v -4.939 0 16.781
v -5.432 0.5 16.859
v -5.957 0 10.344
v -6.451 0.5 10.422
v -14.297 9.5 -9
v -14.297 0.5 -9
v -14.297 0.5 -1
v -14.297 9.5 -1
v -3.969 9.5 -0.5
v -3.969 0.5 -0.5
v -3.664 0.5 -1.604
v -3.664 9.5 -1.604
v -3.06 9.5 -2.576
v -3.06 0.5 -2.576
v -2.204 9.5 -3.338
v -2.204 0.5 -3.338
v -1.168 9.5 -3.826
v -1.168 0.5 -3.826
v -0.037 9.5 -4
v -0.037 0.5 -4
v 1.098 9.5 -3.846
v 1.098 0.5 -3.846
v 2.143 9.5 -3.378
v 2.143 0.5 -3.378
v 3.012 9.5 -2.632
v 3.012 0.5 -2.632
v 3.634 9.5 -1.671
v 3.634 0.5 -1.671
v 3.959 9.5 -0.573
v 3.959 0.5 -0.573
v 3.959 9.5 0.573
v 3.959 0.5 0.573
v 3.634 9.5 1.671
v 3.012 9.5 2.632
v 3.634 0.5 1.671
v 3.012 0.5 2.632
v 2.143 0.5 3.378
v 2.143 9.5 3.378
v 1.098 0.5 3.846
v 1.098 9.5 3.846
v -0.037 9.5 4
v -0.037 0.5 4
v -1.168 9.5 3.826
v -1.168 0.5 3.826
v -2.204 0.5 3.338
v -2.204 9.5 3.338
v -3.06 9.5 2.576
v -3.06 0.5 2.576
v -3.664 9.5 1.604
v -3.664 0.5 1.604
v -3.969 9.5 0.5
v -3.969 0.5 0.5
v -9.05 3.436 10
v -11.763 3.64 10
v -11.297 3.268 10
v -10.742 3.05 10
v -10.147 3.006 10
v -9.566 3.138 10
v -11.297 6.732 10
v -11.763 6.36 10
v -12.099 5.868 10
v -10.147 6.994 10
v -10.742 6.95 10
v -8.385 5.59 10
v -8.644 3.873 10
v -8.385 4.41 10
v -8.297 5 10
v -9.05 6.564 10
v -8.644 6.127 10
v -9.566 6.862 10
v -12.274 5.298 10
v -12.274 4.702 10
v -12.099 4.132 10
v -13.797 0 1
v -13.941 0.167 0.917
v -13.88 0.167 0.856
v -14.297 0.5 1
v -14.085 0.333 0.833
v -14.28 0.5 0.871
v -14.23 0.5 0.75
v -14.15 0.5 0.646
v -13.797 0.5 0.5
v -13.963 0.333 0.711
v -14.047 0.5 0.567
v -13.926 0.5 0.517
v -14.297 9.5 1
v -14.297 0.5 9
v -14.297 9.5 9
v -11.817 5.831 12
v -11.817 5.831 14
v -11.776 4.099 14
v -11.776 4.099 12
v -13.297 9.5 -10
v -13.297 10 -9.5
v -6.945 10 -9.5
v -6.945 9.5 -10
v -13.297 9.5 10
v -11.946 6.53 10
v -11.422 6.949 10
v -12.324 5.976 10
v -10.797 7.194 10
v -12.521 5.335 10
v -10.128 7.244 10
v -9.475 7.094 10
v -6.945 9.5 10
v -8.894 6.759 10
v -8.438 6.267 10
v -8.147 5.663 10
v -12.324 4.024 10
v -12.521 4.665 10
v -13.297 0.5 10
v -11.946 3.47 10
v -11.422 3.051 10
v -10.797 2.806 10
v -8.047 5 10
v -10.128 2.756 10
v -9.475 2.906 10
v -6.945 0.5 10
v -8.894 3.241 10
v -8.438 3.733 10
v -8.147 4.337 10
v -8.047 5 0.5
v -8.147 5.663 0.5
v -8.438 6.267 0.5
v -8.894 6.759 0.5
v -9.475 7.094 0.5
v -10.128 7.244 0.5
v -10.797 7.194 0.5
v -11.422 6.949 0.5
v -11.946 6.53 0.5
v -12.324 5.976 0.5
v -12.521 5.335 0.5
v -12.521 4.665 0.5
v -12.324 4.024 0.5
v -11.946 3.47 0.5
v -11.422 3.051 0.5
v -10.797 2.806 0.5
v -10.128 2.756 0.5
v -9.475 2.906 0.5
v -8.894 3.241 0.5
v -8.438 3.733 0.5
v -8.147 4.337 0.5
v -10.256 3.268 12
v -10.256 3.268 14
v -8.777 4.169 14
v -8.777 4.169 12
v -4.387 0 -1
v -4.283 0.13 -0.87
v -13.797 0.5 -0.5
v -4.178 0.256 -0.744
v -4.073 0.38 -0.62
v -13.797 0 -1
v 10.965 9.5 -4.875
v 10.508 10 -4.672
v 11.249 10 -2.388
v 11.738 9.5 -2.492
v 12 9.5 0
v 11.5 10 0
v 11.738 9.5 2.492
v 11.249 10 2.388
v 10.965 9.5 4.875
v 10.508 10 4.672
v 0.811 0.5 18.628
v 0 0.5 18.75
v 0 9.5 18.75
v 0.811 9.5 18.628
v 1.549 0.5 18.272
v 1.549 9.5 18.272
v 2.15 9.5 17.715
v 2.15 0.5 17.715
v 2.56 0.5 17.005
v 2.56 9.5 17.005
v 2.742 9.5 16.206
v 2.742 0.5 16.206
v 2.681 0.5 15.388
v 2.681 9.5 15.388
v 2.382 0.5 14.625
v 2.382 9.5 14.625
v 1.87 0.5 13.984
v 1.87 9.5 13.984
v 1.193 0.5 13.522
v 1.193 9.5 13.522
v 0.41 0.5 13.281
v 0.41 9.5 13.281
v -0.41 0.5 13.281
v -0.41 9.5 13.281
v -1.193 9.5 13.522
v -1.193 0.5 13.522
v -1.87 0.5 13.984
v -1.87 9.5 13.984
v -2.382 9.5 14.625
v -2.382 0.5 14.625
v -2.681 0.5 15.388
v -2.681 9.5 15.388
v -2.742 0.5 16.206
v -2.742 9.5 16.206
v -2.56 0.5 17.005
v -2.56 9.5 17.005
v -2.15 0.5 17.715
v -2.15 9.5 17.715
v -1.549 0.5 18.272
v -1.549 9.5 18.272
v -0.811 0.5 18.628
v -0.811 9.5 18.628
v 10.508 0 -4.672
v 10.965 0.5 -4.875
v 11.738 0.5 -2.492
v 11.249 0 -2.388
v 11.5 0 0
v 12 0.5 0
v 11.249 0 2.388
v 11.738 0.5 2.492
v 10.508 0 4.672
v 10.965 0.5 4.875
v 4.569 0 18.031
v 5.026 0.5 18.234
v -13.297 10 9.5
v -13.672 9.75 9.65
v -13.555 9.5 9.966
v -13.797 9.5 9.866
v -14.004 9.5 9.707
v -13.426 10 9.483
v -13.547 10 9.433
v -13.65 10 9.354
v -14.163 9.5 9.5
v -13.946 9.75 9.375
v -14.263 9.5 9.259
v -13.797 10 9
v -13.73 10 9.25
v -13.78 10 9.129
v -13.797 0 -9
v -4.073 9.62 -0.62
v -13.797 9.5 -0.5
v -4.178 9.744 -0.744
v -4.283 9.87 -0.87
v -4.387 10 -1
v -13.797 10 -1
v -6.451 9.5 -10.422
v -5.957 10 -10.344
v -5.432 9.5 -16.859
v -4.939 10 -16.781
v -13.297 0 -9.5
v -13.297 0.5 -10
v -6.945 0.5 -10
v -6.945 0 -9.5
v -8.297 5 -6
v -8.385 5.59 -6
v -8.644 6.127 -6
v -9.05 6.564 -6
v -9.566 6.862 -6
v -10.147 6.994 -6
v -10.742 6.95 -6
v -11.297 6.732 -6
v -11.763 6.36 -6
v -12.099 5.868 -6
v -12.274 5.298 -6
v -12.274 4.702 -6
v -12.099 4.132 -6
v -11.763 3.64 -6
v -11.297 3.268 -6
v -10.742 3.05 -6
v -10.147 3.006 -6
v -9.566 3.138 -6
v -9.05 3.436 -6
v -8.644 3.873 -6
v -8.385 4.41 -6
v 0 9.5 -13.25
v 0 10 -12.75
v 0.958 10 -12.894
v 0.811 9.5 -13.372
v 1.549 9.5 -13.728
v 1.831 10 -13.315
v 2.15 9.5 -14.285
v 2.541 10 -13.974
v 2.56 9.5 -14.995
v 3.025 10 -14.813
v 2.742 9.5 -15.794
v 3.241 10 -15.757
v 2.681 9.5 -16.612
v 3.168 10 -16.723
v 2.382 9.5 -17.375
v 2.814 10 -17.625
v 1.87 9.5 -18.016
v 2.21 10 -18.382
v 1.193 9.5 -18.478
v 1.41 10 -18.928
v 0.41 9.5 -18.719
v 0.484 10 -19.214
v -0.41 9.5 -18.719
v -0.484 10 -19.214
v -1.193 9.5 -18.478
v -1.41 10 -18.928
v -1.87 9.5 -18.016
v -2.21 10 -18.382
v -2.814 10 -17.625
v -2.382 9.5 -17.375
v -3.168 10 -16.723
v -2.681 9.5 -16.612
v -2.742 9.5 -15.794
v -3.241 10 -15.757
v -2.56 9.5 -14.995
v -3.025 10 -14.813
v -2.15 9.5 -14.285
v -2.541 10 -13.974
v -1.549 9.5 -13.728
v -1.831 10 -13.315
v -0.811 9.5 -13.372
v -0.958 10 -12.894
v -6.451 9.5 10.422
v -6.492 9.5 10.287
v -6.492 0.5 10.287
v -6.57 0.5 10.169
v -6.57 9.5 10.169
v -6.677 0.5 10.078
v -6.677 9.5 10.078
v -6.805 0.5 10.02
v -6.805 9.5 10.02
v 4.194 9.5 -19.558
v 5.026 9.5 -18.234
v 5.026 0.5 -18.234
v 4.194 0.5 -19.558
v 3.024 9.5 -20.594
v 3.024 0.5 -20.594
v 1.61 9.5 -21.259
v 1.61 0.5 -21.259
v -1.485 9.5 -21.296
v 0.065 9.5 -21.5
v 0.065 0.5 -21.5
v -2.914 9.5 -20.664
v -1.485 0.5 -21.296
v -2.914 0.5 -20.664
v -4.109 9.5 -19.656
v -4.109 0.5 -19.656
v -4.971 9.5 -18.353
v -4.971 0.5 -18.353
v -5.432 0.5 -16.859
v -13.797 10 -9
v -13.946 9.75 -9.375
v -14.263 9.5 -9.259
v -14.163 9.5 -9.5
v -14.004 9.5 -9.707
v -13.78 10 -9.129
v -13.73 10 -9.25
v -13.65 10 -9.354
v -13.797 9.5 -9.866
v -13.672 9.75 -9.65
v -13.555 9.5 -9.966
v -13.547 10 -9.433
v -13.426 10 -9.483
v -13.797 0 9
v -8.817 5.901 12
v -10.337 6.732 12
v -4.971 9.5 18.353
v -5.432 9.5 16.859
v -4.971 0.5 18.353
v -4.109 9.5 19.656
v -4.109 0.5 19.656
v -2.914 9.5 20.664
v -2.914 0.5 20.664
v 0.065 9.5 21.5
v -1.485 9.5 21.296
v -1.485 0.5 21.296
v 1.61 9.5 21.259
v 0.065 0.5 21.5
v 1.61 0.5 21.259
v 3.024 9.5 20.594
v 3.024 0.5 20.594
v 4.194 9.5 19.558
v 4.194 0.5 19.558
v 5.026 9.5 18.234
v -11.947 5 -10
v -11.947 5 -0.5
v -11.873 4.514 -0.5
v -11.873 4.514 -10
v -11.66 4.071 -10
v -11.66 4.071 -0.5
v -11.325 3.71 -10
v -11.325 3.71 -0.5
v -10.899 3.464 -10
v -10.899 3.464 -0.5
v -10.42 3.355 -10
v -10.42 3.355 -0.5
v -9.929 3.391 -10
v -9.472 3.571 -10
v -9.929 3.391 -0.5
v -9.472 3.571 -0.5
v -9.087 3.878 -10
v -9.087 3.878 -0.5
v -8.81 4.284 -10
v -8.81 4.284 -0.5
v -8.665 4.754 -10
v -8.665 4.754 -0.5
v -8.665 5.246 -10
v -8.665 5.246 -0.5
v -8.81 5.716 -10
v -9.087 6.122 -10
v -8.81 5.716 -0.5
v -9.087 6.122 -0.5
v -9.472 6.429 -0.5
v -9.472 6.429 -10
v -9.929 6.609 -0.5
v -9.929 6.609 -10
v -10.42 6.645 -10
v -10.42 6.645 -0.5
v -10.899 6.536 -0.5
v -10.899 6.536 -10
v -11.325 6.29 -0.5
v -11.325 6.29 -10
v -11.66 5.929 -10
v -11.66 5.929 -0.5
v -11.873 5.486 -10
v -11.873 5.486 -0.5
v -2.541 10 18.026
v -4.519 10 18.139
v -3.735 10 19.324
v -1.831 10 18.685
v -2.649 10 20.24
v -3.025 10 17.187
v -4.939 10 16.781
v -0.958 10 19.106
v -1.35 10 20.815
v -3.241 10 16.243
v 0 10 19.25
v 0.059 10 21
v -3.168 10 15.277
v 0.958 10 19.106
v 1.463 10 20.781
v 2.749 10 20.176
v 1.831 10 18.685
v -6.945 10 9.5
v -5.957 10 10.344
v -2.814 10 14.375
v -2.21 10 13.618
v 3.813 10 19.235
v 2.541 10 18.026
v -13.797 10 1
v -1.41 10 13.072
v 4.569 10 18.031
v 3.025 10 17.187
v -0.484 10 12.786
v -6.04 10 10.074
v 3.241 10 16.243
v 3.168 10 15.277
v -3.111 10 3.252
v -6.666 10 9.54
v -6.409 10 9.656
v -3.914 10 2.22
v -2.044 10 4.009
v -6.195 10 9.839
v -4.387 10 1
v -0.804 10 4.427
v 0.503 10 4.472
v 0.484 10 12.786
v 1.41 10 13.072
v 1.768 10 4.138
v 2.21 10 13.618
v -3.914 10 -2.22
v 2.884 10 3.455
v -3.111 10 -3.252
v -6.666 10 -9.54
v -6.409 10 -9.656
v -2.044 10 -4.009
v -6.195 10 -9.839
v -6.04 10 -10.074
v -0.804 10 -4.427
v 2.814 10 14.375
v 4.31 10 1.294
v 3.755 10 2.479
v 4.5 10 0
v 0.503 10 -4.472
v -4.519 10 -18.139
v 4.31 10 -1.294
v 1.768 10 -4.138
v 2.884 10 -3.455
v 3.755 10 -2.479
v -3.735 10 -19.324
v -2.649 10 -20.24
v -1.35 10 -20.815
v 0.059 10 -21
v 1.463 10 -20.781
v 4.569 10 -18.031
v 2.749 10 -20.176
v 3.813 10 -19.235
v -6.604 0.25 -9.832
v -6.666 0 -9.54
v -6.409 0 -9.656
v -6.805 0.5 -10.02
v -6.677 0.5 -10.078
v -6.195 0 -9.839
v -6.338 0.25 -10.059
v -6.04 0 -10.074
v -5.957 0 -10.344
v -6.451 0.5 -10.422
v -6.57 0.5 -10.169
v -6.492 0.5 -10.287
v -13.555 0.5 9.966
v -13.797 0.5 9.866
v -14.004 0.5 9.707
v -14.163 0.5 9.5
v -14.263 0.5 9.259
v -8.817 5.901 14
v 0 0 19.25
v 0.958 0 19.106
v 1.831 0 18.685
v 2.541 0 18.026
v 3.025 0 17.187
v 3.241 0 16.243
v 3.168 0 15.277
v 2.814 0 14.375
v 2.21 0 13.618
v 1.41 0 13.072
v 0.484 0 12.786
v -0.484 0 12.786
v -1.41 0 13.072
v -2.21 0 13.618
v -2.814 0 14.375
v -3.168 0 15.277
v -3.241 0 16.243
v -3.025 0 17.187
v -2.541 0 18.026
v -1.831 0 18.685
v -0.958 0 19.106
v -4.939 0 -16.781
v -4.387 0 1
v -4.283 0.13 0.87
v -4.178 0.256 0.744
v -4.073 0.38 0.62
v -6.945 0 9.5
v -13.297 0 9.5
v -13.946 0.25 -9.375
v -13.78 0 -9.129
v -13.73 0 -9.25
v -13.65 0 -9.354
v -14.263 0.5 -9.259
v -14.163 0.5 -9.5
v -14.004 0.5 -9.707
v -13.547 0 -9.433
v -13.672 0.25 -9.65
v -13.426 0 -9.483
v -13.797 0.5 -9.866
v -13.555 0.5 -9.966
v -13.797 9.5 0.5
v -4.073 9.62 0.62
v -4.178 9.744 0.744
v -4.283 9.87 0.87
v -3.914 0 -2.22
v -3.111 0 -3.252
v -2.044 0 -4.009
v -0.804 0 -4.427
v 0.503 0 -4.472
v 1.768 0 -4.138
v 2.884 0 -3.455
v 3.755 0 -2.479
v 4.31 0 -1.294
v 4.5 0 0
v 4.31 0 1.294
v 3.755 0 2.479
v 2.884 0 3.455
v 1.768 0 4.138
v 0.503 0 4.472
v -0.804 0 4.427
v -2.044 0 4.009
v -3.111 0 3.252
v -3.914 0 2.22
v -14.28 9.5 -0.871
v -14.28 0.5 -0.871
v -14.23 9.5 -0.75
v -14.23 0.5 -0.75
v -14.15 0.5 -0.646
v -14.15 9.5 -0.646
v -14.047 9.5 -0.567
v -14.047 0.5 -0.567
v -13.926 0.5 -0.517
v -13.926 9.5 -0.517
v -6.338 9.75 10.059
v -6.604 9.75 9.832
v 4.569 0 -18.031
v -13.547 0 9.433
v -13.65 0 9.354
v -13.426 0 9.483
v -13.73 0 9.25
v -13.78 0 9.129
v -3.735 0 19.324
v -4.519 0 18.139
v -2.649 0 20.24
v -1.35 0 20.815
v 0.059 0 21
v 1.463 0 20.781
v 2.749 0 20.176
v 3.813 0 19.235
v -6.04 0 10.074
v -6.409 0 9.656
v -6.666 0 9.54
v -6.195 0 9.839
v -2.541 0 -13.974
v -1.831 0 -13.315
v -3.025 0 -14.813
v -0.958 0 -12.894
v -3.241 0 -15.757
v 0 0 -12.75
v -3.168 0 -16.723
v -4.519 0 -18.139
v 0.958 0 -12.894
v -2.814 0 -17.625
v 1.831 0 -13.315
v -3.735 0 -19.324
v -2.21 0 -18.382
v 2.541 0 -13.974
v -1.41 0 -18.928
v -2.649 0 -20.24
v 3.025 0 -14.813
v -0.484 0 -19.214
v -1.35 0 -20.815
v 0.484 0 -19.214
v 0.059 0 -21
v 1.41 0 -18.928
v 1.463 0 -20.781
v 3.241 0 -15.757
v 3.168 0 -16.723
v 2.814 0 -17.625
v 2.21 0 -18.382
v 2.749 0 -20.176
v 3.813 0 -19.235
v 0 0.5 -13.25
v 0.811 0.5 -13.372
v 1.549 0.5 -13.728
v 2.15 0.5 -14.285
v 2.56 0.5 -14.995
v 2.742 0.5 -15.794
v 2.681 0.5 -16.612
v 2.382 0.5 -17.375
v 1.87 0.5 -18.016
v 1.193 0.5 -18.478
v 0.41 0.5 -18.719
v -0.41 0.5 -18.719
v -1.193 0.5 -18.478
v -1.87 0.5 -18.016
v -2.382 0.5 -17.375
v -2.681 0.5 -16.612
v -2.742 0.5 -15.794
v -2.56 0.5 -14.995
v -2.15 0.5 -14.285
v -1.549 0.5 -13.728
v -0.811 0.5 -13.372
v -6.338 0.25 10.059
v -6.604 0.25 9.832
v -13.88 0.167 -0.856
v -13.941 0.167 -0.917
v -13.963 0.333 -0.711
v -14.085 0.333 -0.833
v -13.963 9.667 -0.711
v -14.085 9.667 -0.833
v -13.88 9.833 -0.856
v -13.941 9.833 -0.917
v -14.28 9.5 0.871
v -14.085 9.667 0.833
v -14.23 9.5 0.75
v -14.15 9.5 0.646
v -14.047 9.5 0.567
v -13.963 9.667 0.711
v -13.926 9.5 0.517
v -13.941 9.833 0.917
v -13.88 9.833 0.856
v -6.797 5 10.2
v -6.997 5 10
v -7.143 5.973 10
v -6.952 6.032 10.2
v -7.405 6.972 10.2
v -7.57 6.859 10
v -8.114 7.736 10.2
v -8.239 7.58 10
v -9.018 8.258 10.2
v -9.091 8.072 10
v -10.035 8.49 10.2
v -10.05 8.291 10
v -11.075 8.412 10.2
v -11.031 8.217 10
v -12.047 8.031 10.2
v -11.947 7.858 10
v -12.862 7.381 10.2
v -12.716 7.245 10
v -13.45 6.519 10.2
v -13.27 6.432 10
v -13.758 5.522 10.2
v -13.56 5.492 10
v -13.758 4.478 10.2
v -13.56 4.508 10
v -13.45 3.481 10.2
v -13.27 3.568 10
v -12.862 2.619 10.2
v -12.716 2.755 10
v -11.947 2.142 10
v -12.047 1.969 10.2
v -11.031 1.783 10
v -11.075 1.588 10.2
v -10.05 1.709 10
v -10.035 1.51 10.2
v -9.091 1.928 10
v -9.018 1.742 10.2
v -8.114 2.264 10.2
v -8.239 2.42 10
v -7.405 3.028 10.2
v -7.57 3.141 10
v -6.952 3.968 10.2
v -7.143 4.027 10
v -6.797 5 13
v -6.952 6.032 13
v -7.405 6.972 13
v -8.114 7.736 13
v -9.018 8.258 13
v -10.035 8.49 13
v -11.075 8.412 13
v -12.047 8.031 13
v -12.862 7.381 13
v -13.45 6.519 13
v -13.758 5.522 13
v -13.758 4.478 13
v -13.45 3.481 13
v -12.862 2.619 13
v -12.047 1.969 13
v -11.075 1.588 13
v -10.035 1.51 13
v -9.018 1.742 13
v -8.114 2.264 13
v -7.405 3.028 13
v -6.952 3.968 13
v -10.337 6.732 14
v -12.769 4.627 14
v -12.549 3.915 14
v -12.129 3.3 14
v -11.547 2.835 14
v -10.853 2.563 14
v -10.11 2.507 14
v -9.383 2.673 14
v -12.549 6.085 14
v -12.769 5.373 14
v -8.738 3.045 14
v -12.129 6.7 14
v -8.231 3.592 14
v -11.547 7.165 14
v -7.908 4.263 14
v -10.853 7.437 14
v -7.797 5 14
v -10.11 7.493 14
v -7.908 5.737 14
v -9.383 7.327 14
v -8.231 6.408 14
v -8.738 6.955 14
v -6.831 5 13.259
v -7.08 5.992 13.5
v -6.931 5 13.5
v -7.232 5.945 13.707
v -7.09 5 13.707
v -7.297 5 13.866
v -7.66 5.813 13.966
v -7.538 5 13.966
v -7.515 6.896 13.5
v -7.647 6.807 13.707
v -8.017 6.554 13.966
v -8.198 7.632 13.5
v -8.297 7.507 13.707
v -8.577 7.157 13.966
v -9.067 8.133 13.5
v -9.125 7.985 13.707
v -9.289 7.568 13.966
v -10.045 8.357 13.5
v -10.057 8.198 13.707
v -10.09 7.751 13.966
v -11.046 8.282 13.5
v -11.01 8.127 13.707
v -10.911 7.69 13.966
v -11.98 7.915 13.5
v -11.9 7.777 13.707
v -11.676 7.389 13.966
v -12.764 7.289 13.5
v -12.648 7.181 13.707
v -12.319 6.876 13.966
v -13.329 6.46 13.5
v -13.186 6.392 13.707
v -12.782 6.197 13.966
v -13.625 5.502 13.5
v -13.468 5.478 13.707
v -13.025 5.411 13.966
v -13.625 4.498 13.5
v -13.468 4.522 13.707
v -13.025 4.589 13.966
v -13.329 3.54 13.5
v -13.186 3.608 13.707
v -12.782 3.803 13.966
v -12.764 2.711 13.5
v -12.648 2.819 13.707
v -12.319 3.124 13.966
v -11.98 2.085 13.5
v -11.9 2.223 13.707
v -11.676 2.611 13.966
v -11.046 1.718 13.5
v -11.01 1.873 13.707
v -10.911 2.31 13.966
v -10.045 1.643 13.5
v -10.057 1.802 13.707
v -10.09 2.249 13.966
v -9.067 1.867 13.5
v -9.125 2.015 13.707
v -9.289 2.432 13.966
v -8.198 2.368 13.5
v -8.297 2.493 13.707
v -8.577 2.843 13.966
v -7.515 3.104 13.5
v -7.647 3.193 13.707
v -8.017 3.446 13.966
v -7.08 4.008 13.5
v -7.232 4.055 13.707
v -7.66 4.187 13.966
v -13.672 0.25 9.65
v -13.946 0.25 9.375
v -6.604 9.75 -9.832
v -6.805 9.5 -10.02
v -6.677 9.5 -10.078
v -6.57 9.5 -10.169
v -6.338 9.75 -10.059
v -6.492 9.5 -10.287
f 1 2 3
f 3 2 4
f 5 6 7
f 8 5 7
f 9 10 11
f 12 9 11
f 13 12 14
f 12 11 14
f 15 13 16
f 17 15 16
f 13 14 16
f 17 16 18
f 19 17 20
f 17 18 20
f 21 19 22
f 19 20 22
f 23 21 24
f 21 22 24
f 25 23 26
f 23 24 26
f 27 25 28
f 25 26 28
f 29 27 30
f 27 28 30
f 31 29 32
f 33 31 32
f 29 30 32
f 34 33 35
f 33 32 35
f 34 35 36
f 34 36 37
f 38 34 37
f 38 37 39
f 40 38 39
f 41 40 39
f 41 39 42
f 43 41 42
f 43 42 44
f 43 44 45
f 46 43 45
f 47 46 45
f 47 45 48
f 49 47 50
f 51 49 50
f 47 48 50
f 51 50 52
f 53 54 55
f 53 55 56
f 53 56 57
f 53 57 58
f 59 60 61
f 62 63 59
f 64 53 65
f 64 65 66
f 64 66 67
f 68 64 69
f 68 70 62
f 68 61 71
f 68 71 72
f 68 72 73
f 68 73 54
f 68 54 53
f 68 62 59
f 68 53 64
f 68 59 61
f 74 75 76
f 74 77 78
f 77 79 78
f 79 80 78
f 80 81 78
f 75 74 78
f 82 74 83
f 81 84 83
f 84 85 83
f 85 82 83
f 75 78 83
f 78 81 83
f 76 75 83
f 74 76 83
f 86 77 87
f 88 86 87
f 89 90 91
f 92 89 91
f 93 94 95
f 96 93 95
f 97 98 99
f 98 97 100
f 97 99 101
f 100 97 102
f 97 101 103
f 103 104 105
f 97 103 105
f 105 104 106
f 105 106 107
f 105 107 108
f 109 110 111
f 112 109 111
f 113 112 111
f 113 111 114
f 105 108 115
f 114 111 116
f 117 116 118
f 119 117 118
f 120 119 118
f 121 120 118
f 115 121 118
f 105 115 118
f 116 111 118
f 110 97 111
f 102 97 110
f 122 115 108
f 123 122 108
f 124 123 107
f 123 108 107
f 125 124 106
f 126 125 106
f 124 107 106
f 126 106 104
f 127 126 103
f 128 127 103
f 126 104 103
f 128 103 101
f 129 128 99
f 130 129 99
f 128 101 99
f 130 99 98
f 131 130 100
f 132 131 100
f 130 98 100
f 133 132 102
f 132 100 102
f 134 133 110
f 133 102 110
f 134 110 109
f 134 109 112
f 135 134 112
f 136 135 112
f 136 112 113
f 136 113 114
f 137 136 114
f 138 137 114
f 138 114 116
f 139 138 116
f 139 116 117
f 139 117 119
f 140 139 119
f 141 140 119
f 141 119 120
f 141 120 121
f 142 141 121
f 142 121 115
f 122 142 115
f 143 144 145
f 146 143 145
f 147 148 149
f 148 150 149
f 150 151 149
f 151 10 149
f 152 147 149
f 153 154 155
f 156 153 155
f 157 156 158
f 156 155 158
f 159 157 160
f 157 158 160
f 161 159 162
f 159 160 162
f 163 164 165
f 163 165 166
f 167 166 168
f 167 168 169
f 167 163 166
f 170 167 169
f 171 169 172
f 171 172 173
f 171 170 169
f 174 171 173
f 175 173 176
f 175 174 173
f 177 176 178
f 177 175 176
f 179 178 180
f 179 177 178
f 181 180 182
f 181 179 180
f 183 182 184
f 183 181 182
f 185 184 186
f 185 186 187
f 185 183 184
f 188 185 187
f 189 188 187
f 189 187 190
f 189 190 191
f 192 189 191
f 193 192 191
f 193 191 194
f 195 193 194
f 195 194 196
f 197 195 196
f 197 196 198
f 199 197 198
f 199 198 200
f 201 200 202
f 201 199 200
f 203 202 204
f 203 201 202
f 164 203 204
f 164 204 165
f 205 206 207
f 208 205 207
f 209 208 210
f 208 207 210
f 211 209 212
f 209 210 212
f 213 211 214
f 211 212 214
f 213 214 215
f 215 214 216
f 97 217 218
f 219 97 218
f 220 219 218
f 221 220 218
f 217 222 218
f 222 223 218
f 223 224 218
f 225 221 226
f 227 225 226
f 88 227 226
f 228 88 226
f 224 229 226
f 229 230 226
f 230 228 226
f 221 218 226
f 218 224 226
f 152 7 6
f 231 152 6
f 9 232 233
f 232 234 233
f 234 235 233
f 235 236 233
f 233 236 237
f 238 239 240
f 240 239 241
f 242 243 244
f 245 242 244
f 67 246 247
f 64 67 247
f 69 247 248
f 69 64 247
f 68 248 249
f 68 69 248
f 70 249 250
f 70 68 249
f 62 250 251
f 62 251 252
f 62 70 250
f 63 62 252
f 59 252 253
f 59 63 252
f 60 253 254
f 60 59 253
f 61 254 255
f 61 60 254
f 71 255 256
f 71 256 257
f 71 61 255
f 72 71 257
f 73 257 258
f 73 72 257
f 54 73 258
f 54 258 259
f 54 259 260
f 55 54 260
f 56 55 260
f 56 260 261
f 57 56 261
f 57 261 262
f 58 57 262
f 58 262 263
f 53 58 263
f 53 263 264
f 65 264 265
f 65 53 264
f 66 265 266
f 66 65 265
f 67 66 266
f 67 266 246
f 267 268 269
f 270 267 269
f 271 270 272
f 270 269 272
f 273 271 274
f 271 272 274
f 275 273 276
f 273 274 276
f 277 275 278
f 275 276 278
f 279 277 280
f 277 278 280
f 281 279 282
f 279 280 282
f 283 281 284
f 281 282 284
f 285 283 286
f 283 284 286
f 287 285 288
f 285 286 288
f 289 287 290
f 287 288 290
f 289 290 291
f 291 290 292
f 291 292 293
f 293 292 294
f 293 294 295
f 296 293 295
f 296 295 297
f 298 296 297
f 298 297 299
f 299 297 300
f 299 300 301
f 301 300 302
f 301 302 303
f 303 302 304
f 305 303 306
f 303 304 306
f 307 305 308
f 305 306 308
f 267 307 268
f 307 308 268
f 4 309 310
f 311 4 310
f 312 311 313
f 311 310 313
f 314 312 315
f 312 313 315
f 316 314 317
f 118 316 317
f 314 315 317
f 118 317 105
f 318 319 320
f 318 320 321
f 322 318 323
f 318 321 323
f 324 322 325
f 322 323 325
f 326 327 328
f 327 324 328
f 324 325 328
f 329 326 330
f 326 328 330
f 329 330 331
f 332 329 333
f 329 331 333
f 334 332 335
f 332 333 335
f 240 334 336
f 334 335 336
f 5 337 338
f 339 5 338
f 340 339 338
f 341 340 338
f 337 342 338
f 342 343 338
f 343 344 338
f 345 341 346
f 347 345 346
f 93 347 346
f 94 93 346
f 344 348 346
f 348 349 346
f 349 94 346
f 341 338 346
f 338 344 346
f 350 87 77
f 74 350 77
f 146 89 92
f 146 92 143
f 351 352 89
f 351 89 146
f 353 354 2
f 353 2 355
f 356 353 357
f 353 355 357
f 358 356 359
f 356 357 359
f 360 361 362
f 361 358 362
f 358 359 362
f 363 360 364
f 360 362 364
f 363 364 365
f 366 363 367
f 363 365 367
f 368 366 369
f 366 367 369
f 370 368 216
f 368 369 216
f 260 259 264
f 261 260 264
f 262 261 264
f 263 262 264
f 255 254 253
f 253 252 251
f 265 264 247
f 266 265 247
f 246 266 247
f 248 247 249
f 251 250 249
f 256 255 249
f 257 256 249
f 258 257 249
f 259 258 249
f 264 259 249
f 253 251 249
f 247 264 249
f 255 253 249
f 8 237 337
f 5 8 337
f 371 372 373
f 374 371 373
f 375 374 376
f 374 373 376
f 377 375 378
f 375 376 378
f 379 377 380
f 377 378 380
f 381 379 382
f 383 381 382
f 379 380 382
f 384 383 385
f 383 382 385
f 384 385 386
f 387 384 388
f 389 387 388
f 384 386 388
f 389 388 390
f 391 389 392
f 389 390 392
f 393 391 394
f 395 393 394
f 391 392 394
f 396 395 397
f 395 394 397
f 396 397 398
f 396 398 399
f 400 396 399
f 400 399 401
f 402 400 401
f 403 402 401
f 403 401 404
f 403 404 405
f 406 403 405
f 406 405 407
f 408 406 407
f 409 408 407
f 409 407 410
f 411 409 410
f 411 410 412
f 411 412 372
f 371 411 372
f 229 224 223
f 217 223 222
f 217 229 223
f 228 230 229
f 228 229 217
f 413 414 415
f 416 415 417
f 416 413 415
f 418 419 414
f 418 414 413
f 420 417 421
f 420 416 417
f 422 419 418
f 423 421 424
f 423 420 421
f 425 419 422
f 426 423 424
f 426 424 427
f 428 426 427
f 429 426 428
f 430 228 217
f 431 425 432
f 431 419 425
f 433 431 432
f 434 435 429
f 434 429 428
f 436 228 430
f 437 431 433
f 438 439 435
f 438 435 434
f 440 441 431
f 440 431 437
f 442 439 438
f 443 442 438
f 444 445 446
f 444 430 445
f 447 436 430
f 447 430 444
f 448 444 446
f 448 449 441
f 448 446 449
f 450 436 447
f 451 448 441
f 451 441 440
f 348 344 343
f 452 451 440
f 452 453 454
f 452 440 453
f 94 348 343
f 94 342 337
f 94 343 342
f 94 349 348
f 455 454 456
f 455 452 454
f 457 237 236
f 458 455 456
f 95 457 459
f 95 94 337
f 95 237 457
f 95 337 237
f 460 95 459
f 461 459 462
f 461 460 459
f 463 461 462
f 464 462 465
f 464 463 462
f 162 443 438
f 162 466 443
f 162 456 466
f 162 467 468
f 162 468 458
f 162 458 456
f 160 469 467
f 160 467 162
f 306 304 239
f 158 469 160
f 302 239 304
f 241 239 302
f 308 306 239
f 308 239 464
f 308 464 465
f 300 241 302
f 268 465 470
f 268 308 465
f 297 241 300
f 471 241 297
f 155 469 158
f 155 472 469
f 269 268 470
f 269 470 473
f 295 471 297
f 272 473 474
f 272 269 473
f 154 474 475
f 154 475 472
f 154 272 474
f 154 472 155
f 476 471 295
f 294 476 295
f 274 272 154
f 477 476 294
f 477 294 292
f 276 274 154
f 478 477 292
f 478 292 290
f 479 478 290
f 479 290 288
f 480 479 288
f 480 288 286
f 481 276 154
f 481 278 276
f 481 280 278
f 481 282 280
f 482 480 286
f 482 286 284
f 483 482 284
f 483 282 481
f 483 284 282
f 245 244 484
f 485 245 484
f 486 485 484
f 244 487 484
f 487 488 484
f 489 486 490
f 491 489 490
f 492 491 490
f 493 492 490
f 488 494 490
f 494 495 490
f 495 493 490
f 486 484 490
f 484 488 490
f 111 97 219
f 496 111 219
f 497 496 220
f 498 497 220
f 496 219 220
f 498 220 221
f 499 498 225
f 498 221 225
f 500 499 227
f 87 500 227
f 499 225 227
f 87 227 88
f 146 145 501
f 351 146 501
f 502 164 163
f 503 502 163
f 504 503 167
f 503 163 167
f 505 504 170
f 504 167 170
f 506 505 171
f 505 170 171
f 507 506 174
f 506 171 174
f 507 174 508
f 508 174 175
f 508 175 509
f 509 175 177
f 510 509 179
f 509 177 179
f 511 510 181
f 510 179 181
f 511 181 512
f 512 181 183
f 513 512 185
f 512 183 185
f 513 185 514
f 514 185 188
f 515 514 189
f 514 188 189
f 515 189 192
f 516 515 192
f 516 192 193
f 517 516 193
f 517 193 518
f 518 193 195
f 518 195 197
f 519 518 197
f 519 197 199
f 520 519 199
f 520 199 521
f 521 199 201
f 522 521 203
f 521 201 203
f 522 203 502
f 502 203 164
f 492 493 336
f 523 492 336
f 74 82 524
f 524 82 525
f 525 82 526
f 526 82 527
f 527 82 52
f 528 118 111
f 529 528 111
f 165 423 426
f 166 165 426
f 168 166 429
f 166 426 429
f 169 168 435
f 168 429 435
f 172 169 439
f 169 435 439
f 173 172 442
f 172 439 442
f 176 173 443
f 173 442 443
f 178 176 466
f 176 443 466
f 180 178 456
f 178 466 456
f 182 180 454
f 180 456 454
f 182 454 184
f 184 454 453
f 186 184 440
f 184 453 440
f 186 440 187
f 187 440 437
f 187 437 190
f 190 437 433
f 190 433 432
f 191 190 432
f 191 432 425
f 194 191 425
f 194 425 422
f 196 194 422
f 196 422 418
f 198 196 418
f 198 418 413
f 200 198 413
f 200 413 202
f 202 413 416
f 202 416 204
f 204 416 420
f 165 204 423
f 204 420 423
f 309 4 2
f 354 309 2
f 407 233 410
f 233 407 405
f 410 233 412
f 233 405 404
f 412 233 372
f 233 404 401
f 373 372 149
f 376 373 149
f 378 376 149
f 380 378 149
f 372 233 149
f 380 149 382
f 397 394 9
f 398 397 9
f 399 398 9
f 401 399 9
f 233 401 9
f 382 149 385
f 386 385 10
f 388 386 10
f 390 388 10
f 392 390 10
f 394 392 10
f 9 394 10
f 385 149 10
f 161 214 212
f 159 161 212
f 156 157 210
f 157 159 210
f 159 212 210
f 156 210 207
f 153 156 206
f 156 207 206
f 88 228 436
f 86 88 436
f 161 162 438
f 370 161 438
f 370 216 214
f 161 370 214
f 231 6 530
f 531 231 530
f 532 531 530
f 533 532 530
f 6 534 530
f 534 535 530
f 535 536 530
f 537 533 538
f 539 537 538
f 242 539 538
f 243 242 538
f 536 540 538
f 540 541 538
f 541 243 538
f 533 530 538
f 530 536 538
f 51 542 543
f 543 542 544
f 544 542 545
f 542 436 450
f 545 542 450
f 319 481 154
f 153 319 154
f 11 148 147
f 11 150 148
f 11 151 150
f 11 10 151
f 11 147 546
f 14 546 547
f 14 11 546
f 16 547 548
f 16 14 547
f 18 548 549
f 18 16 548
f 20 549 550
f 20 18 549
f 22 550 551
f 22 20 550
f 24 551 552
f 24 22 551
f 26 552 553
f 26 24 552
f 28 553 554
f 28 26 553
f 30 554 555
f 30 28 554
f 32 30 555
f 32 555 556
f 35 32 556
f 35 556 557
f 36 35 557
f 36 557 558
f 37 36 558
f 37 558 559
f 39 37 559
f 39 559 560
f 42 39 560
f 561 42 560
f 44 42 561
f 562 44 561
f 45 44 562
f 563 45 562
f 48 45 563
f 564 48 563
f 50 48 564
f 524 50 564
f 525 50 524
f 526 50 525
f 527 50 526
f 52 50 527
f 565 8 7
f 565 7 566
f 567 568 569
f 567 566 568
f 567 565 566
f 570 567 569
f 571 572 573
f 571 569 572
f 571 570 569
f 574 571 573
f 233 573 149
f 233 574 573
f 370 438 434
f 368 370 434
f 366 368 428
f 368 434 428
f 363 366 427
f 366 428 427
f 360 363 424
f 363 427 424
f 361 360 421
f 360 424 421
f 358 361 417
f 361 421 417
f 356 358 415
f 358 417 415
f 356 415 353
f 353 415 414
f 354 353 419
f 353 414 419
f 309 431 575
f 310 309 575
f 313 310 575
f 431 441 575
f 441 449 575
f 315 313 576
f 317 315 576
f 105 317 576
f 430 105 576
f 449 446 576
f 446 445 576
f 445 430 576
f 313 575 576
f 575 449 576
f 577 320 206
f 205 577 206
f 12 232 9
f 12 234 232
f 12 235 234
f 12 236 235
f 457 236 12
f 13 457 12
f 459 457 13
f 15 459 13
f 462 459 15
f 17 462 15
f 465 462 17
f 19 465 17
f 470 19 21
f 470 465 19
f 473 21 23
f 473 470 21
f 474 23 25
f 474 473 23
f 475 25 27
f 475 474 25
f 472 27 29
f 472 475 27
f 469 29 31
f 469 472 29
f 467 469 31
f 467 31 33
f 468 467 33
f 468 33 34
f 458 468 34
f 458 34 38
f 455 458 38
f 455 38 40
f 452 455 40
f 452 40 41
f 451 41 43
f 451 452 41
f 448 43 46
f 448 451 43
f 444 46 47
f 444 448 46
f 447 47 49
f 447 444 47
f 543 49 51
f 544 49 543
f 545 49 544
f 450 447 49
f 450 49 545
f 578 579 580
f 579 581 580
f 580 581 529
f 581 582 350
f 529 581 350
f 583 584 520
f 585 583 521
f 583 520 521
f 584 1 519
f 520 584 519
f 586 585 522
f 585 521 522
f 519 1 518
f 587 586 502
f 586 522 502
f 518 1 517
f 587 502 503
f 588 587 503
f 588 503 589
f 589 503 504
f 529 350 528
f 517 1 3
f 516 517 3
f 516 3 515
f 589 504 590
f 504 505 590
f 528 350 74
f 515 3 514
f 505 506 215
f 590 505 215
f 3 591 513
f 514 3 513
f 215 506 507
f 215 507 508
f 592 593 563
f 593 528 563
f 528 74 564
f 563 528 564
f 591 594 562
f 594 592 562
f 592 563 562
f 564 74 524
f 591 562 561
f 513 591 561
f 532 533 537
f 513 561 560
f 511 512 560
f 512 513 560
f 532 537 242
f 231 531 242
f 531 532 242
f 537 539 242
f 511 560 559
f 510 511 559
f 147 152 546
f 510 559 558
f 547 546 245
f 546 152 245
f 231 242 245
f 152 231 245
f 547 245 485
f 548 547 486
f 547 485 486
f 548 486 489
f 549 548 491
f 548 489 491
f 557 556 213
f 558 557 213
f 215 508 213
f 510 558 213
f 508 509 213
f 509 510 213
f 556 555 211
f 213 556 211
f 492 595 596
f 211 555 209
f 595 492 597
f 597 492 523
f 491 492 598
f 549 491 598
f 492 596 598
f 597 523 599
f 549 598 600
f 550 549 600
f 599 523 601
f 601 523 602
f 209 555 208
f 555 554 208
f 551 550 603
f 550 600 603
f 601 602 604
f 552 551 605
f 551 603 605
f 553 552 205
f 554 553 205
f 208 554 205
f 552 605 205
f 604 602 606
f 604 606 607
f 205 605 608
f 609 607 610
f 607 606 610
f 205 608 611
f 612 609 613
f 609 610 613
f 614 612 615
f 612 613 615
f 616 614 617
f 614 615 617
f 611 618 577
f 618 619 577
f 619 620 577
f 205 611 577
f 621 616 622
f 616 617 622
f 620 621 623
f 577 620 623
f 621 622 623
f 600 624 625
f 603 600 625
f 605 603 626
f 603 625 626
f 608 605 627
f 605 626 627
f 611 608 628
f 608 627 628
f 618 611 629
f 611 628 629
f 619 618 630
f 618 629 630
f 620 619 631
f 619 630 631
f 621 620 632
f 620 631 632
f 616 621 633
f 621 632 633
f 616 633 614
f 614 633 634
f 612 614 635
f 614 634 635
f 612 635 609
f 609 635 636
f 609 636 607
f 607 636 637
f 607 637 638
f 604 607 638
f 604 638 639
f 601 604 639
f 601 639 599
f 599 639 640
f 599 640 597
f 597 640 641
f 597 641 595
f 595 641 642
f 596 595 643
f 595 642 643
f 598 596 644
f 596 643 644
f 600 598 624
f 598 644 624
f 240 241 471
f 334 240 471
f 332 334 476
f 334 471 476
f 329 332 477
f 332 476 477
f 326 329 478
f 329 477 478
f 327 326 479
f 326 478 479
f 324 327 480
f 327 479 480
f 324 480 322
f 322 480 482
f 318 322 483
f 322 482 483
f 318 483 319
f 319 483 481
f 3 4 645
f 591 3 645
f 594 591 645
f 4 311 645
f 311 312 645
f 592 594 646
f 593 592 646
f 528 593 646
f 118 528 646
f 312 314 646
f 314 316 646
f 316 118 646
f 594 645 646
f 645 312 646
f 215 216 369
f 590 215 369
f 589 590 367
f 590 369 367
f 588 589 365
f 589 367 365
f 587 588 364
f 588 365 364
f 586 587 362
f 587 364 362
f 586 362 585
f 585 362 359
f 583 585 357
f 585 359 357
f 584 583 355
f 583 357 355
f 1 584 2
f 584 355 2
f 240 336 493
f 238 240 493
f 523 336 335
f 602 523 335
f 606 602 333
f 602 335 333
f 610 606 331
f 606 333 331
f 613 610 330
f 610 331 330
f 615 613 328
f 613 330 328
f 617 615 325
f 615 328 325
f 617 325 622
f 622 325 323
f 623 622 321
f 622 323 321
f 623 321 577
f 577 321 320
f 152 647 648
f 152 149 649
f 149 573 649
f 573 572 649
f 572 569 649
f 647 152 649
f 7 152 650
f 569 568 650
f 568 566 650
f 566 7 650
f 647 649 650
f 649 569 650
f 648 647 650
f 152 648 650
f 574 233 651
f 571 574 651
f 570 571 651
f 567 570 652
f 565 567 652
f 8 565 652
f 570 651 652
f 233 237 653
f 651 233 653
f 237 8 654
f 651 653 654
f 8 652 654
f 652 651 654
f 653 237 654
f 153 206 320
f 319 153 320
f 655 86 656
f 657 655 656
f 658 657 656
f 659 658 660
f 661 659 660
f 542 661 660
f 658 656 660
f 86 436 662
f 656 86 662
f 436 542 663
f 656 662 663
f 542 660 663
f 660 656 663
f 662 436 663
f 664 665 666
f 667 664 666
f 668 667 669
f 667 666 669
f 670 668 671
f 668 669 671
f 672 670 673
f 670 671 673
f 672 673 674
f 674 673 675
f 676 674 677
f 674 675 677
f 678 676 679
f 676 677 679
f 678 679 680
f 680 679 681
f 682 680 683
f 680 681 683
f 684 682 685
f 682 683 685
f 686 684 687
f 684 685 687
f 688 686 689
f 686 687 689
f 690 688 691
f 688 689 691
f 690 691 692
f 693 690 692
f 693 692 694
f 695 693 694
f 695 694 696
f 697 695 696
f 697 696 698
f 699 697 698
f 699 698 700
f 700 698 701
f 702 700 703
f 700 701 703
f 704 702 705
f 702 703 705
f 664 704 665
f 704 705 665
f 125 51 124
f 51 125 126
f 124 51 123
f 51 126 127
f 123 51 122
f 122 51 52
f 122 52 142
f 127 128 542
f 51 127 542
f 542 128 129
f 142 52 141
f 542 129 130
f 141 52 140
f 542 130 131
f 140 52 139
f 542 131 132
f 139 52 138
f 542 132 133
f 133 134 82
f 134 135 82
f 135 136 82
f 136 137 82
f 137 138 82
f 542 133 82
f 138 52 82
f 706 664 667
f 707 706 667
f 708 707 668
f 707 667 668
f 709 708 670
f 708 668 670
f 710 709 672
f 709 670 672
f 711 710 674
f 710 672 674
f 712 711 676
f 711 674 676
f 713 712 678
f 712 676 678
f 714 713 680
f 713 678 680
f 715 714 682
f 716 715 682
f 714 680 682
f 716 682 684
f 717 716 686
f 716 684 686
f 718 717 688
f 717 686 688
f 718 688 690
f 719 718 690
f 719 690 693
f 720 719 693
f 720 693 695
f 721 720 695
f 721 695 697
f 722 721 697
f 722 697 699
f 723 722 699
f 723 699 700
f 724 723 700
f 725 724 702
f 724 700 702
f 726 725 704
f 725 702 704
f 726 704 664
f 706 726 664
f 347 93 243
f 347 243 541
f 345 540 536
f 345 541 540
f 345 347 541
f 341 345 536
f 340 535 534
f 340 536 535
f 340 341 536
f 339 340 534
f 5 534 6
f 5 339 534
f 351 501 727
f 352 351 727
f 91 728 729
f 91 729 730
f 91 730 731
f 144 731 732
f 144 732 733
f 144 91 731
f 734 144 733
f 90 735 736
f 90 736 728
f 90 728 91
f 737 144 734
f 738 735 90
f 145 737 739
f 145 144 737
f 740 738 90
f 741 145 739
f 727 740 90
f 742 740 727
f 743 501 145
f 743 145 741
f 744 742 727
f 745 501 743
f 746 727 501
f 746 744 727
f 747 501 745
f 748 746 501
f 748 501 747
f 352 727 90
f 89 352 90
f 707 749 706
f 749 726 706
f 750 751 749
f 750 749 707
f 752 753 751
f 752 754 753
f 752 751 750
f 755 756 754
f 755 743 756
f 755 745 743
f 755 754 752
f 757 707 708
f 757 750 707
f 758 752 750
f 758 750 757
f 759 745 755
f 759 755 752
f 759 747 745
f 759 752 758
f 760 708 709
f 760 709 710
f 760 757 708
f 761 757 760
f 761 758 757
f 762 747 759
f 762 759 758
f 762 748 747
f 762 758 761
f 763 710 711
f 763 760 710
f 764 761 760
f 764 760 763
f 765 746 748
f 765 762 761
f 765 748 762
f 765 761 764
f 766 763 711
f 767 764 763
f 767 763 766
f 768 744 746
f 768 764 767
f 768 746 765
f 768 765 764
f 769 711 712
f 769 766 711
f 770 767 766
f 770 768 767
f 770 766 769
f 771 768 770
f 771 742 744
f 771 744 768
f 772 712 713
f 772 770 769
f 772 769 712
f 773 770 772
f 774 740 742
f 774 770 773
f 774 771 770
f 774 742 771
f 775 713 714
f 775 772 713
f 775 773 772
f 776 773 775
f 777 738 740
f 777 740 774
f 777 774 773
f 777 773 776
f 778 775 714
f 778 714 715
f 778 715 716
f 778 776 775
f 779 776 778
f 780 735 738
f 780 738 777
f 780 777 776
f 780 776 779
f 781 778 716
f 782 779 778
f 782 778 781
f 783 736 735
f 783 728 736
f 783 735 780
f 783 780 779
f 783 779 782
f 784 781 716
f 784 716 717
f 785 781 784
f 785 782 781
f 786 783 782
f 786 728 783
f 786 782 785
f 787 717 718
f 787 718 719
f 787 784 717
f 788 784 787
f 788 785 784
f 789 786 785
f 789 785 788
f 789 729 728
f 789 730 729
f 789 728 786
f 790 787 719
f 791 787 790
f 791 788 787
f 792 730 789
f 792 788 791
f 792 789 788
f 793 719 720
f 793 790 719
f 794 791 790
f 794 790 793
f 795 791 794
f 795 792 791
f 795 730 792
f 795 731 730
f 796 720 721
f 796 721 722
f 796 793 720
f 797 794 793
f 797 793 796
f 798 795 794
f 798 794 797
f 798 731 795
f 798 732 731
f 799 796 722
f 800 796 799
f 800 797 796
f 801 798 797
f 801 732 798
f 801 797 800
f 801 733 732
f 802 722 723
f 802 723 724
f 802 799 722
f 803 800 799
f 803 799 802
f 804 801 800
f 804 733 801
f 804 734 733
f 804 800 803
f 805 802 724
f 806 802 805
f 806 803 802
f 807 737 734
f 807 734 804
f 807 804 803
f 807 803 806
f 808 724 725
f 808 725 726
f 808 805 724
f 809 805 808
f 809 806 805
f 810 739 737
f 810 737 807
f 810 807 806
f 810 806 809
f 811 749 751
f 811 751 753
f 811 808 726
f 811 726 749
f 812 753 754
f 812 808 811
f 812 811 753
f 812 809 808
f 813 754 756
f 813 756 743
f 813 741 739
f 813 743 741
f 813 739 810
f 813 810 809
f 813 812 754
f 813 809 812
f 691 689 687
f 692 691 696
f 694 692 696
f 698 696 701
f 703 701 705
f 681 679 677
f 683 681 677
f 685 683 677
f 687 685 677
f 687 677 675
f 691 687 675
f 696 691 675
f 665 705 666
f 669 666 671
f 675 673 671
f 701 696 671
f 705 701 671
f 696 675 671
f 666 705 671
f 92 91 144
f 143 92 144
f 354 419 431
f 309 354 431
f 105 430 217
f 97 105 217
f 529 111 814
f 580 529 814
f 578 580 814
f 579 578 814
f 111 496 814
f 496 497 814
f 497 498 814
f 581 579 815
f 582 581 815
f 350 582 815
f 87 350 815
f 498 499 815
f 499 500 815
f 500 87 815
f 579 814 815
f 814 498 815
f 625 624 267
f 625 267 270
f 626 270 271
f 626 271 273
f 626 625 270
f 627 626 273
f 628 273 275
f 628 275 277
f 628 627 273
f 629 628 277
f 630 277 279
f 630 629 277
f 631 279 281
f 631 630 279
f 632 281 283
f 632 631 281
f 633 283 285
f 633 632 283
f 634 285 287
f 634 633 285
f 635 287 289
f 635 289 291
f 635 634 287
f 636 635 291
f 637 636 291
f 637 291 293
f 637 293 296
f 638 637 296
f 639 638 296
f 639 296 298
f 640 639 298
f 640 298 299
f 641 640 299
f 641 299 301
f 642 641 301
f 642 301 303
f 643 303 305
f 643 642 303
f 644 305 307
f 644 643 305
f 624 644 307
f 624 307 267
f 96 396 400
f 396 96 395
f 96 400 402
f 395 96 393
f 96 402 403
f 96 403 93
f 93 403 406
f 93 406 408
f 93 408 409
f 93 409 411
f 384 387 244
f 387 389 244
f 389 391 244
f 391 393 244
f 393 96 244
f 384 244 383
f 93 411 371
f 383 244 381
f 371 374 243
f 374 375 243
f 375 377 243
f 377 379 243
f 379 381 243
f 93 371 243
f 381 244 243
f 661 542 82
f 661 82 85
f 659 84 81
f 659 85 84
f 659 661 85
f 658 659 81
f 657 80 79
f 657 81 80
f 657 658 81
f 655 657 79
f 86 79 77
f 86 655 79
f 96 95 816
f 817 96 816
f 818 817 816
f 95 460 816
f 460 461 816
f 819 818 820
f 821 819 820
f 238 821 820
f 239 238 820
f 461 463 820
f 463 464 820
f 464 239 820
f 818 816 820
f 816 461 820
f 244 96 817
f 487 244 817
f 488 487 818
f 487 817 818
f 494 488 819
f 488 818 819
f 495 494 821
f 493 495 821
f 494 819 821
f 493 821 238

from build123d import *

# Parameters (mm, degrees)
SKETCH_1_R          = 2.75
EXTRUDE_1_DEPTH     = 10
CUT_EXTRUDE_1_REACH = 38.009
SKETCH_3_R          = 2.25
SKETCH_3_3_R        = 1.65
CUT_EXTRUDE_2_DEPTH = 37.00893353
FILLET_1_R          = 1
FILLET_2_R          = 0.5
CHAMFER_1_SIZE      = 0.5
SKETCH_4_R          = 3.5
EXTRUDE_2_DEPTH     = 4
FILLET_3_R          = 1
CUT_EXTRUDE_3_DEPTH = 2
CHAMFER_2_SIZE      = 0.2
SKETCH_6_R          = 2
EXTRUDE_3_DEPTH     = 16


with BuildPart() as part:
    # 草图1 → 凸台-拉伸1 (new body)
    with BuildSketch(Plane(origin=(0, 0, 0), x_dir=(1, 0, 0), z_dir=(0, 1, 0))):
        with BuildLine():
            ThreePointArc((5.025690834, 18.234375), (-0.716951035, 21.453070806), (-5.432446466, 16.859375))
            Line((-5.432446466, 16.859375), (-6.517551571, 10))
            Line((-6.517551571, 10), (-14.296618271, 10))
            Line((-14.296618271, 10), (-14.296618271, 0.5))
            Line((-14.296618271, 0.5), (-3.968626967, 0.5))
            ThreePointArc((-3.968626967, 0.5), (4, 0), (-3.968626967, -0.5))
            Line((-3.968626967, -0.5), (-14.296618271, -0.5))
            Line((-14.296618271, -0.5), (-14.296618271, -10))
            Line((-14.296618271, -10), (-6.517551571, -10))
            Line((-6.517551571, -10), (-5.432446466, -16.859375))
            ThreePointArc((-5.432446466, -16.859375), (-0.716951035, -21.453070806), (5.025690834, -18.234375))
            Line((5.025690834, -18.234375), (10.965143638, -4.875))
            ThreePointArc((10.965143638, -4.875), (12, 0), (10.965143638, 4.875))
            Line((10.965143638, 4.875), (5.025690834, 18.234375))
        make_face()
        with Locations(Location((0, -16, 0), (0, 0, 270))):
            Circle(SKETCH_1_R, mode=Mode.SUBTRACT)
        with Locations(Location((0, 16, 0), (0, 0, 270))):
            Circle(SKETCH_1_R, mode=Mode.SUBTRACT)
    extrude(amount=EXTRUDE_1_DEPTH)

    # 草图3 → 切除-拉伸1 (cut, up to next)
    with BuildSketch(Plane.XY.offset(10), mode=Mode.PRIVATE) as cut_extrude_1_sk1:
        with Locations((-10.296618271, 5)):
            Circle(SKETCH_3_R)
    cut_extrude_1_tool1 = extrude(cut_extrude_1_sk1.sketch, amount=-CUT_EXTRUDE_1_REACH, mode=Mode.PRIVATE) & part.part
    add(cut_extrude_1_tool1.solids().sort_by_distance((-10.296618, 5, 10))[0], mode=Mode.SUBTRACT)

    # 草图3<3> → 切除-拉伸2 (cut, through all)
    with BuildSketch(Plane.XY.offset(10)):
        with Locations(Location((-10.296618271, 5, 0), (0, 0, 180))):
            Circle(SKETCH_3_3_R)
    extrude(amount=-CUT_EXTRUDE_2_DEPTH, mode=Mode.SUBTRACT)

    # 圆角1
    fillet_1_edges = [part.edges().sort_by_distance(p)[0] for p in [
        (-14.296618271, 5, 10),
        (-14.296618271, 5, -10),
    ]]
    fillet(fillet_1_edges, radius=FILLET_1_R)

    # 圆角2
    fillet_2_edges = [part.edges().sort_by_distance(p)[0] for p in [
        (-6.517551571, 5, 10),
        (-14.296618271, 5, 0.5),
        (-14.296618271, 5, -0.5),
        (-6.517551571, 5, -10),
    ]]
    fillet(fillet_2_edges, radius=FILLET_2_R)

    # 倒角1
    chamfer_1_edges = [part.edges().sort_by_distance(p)[0] for p in [
        (-6.619913143, 0, 10.119827342),
        (-6.619913143, 10, 10.119827342),
        (-6.619913143, 0, -10.119827342),
        (-6.619913143, 10, -10.119827342),
        (-0.716951035, 10, 21.453070806),
        (7.995417236, 10, 11.5546875),
        (0, 0, 13.25),
        (0, 0, -18.75),
        (4, 0, 0),
        (12, 10, 0),
        (-5.941630183, 0, -13.640625),
        (-0.716951035, 0, -21.453070806),
        (7.995417236, 0, -11.5546875),
        (12, 0, 0),
        (7.995417236, 0, 11.5546875),
        (-0.716951035, 0, 21.453070806),
        (-5.941630183, 0, 13.640625),
        (7.995417236, 10, -11.5546875),
        (-0.716951035, 10, -21.453070806),
        (-5.941630183, 10, -13.640625),
        (4, 10, 0),
        (-14.296618271, 0, -5),
        (-14.296618271, 10, -5),
        (-10.12064547, 0, 10),
        (-10.12064547, 0, -10),
        (-14.003725052, 0, 9.707106781),
        (-14.003725052, 0, -9.707106781),
        (-10.12064547, 10, -10),
        (-5.941630183, 10, 13.640625),
        (-10.12064547, 10, 10),
        (-14.003725052, 10, 9.707106781),
        (-14.003725052, 10, -9.707106781),
        (0, 10, -18.75),
        (-8.882622619, 0, -0.5),
        (-8.882622619, 10, -0.5),
        (0, 10, 13.25),
        (-14.296618271, 0, 5),
        (-8.882622619, 0, 0.5),
        (-14.150171662, 0, 0.646446609),
        (-14.150171662, 0, -0.646446609),
        (-8.882622619, 10, 0.5),
        (-14.296618271, 10, 5),
        (-14.150171662, 10, 0.646446609),
        (-14.150171662, 10, -0.646446609),
    ]]
    chamfer(chamfer_1_edges, length=CHAMFER_1_SIZE - 0.0001)  # a hair under: the kernel refuses the full size


with BuildPart() as body_2:
    # 草图4 → 凸台-拉伸2 (new body)
    with BuildSketch(Plane.XY.offset(10)):
        with Locations((-10.296618271, 5)):
            Circle(SKETCH_4_R)
    extrude(amount=EXTRUDE_2_DEPTH)

    # 圆角3
    fillet_3_edges = [body_2.edges().sort_by_distance(p)[0] for p in [
        (-13.796618271, 5, 14),
    ]]
    fillet(fillet_3_edges, radius=FILLET_3_R)

    # 草图5 → 切除-拉伸3 (cut)
    with BuildSketch(Plane.XY.offset(14)):
        Polygon((-8.817397687, 5.901058523), (-10.33734755, 6.731571866), (-11.816568135, 5.830513342), (-11.775838856, 4.098941477), (-10.255888992, 3.268428134), (-8.776668408, 4.169486658), align=None)
    extrude(amount=-CUT_EXTRUDE_3_DEPTH, mode=Mode.SUBTRACT)

    # 倒角2
    chamfer_2_edges = [body_2.edges().sort_by_distance(p)[0] for p in [
        (-13.796618271, 5, 10),
    ]]
    chamfer(chamfer_2_edges, length=CHAMFER_2_SIZE)


with BuildPart() as body_3:
    # 草图6 → 凸台-拉伸3 (new body)
    with BuildSketch(Plane.XY.offset(10)):
        with Locations((-10.296618271, 5)):
            Circle(SKETCH_6_R)
    extrude(amount=-EXTRUDE_3_DEPTH)


solid = Compound([part.part, body_2.part, body_3.part])
